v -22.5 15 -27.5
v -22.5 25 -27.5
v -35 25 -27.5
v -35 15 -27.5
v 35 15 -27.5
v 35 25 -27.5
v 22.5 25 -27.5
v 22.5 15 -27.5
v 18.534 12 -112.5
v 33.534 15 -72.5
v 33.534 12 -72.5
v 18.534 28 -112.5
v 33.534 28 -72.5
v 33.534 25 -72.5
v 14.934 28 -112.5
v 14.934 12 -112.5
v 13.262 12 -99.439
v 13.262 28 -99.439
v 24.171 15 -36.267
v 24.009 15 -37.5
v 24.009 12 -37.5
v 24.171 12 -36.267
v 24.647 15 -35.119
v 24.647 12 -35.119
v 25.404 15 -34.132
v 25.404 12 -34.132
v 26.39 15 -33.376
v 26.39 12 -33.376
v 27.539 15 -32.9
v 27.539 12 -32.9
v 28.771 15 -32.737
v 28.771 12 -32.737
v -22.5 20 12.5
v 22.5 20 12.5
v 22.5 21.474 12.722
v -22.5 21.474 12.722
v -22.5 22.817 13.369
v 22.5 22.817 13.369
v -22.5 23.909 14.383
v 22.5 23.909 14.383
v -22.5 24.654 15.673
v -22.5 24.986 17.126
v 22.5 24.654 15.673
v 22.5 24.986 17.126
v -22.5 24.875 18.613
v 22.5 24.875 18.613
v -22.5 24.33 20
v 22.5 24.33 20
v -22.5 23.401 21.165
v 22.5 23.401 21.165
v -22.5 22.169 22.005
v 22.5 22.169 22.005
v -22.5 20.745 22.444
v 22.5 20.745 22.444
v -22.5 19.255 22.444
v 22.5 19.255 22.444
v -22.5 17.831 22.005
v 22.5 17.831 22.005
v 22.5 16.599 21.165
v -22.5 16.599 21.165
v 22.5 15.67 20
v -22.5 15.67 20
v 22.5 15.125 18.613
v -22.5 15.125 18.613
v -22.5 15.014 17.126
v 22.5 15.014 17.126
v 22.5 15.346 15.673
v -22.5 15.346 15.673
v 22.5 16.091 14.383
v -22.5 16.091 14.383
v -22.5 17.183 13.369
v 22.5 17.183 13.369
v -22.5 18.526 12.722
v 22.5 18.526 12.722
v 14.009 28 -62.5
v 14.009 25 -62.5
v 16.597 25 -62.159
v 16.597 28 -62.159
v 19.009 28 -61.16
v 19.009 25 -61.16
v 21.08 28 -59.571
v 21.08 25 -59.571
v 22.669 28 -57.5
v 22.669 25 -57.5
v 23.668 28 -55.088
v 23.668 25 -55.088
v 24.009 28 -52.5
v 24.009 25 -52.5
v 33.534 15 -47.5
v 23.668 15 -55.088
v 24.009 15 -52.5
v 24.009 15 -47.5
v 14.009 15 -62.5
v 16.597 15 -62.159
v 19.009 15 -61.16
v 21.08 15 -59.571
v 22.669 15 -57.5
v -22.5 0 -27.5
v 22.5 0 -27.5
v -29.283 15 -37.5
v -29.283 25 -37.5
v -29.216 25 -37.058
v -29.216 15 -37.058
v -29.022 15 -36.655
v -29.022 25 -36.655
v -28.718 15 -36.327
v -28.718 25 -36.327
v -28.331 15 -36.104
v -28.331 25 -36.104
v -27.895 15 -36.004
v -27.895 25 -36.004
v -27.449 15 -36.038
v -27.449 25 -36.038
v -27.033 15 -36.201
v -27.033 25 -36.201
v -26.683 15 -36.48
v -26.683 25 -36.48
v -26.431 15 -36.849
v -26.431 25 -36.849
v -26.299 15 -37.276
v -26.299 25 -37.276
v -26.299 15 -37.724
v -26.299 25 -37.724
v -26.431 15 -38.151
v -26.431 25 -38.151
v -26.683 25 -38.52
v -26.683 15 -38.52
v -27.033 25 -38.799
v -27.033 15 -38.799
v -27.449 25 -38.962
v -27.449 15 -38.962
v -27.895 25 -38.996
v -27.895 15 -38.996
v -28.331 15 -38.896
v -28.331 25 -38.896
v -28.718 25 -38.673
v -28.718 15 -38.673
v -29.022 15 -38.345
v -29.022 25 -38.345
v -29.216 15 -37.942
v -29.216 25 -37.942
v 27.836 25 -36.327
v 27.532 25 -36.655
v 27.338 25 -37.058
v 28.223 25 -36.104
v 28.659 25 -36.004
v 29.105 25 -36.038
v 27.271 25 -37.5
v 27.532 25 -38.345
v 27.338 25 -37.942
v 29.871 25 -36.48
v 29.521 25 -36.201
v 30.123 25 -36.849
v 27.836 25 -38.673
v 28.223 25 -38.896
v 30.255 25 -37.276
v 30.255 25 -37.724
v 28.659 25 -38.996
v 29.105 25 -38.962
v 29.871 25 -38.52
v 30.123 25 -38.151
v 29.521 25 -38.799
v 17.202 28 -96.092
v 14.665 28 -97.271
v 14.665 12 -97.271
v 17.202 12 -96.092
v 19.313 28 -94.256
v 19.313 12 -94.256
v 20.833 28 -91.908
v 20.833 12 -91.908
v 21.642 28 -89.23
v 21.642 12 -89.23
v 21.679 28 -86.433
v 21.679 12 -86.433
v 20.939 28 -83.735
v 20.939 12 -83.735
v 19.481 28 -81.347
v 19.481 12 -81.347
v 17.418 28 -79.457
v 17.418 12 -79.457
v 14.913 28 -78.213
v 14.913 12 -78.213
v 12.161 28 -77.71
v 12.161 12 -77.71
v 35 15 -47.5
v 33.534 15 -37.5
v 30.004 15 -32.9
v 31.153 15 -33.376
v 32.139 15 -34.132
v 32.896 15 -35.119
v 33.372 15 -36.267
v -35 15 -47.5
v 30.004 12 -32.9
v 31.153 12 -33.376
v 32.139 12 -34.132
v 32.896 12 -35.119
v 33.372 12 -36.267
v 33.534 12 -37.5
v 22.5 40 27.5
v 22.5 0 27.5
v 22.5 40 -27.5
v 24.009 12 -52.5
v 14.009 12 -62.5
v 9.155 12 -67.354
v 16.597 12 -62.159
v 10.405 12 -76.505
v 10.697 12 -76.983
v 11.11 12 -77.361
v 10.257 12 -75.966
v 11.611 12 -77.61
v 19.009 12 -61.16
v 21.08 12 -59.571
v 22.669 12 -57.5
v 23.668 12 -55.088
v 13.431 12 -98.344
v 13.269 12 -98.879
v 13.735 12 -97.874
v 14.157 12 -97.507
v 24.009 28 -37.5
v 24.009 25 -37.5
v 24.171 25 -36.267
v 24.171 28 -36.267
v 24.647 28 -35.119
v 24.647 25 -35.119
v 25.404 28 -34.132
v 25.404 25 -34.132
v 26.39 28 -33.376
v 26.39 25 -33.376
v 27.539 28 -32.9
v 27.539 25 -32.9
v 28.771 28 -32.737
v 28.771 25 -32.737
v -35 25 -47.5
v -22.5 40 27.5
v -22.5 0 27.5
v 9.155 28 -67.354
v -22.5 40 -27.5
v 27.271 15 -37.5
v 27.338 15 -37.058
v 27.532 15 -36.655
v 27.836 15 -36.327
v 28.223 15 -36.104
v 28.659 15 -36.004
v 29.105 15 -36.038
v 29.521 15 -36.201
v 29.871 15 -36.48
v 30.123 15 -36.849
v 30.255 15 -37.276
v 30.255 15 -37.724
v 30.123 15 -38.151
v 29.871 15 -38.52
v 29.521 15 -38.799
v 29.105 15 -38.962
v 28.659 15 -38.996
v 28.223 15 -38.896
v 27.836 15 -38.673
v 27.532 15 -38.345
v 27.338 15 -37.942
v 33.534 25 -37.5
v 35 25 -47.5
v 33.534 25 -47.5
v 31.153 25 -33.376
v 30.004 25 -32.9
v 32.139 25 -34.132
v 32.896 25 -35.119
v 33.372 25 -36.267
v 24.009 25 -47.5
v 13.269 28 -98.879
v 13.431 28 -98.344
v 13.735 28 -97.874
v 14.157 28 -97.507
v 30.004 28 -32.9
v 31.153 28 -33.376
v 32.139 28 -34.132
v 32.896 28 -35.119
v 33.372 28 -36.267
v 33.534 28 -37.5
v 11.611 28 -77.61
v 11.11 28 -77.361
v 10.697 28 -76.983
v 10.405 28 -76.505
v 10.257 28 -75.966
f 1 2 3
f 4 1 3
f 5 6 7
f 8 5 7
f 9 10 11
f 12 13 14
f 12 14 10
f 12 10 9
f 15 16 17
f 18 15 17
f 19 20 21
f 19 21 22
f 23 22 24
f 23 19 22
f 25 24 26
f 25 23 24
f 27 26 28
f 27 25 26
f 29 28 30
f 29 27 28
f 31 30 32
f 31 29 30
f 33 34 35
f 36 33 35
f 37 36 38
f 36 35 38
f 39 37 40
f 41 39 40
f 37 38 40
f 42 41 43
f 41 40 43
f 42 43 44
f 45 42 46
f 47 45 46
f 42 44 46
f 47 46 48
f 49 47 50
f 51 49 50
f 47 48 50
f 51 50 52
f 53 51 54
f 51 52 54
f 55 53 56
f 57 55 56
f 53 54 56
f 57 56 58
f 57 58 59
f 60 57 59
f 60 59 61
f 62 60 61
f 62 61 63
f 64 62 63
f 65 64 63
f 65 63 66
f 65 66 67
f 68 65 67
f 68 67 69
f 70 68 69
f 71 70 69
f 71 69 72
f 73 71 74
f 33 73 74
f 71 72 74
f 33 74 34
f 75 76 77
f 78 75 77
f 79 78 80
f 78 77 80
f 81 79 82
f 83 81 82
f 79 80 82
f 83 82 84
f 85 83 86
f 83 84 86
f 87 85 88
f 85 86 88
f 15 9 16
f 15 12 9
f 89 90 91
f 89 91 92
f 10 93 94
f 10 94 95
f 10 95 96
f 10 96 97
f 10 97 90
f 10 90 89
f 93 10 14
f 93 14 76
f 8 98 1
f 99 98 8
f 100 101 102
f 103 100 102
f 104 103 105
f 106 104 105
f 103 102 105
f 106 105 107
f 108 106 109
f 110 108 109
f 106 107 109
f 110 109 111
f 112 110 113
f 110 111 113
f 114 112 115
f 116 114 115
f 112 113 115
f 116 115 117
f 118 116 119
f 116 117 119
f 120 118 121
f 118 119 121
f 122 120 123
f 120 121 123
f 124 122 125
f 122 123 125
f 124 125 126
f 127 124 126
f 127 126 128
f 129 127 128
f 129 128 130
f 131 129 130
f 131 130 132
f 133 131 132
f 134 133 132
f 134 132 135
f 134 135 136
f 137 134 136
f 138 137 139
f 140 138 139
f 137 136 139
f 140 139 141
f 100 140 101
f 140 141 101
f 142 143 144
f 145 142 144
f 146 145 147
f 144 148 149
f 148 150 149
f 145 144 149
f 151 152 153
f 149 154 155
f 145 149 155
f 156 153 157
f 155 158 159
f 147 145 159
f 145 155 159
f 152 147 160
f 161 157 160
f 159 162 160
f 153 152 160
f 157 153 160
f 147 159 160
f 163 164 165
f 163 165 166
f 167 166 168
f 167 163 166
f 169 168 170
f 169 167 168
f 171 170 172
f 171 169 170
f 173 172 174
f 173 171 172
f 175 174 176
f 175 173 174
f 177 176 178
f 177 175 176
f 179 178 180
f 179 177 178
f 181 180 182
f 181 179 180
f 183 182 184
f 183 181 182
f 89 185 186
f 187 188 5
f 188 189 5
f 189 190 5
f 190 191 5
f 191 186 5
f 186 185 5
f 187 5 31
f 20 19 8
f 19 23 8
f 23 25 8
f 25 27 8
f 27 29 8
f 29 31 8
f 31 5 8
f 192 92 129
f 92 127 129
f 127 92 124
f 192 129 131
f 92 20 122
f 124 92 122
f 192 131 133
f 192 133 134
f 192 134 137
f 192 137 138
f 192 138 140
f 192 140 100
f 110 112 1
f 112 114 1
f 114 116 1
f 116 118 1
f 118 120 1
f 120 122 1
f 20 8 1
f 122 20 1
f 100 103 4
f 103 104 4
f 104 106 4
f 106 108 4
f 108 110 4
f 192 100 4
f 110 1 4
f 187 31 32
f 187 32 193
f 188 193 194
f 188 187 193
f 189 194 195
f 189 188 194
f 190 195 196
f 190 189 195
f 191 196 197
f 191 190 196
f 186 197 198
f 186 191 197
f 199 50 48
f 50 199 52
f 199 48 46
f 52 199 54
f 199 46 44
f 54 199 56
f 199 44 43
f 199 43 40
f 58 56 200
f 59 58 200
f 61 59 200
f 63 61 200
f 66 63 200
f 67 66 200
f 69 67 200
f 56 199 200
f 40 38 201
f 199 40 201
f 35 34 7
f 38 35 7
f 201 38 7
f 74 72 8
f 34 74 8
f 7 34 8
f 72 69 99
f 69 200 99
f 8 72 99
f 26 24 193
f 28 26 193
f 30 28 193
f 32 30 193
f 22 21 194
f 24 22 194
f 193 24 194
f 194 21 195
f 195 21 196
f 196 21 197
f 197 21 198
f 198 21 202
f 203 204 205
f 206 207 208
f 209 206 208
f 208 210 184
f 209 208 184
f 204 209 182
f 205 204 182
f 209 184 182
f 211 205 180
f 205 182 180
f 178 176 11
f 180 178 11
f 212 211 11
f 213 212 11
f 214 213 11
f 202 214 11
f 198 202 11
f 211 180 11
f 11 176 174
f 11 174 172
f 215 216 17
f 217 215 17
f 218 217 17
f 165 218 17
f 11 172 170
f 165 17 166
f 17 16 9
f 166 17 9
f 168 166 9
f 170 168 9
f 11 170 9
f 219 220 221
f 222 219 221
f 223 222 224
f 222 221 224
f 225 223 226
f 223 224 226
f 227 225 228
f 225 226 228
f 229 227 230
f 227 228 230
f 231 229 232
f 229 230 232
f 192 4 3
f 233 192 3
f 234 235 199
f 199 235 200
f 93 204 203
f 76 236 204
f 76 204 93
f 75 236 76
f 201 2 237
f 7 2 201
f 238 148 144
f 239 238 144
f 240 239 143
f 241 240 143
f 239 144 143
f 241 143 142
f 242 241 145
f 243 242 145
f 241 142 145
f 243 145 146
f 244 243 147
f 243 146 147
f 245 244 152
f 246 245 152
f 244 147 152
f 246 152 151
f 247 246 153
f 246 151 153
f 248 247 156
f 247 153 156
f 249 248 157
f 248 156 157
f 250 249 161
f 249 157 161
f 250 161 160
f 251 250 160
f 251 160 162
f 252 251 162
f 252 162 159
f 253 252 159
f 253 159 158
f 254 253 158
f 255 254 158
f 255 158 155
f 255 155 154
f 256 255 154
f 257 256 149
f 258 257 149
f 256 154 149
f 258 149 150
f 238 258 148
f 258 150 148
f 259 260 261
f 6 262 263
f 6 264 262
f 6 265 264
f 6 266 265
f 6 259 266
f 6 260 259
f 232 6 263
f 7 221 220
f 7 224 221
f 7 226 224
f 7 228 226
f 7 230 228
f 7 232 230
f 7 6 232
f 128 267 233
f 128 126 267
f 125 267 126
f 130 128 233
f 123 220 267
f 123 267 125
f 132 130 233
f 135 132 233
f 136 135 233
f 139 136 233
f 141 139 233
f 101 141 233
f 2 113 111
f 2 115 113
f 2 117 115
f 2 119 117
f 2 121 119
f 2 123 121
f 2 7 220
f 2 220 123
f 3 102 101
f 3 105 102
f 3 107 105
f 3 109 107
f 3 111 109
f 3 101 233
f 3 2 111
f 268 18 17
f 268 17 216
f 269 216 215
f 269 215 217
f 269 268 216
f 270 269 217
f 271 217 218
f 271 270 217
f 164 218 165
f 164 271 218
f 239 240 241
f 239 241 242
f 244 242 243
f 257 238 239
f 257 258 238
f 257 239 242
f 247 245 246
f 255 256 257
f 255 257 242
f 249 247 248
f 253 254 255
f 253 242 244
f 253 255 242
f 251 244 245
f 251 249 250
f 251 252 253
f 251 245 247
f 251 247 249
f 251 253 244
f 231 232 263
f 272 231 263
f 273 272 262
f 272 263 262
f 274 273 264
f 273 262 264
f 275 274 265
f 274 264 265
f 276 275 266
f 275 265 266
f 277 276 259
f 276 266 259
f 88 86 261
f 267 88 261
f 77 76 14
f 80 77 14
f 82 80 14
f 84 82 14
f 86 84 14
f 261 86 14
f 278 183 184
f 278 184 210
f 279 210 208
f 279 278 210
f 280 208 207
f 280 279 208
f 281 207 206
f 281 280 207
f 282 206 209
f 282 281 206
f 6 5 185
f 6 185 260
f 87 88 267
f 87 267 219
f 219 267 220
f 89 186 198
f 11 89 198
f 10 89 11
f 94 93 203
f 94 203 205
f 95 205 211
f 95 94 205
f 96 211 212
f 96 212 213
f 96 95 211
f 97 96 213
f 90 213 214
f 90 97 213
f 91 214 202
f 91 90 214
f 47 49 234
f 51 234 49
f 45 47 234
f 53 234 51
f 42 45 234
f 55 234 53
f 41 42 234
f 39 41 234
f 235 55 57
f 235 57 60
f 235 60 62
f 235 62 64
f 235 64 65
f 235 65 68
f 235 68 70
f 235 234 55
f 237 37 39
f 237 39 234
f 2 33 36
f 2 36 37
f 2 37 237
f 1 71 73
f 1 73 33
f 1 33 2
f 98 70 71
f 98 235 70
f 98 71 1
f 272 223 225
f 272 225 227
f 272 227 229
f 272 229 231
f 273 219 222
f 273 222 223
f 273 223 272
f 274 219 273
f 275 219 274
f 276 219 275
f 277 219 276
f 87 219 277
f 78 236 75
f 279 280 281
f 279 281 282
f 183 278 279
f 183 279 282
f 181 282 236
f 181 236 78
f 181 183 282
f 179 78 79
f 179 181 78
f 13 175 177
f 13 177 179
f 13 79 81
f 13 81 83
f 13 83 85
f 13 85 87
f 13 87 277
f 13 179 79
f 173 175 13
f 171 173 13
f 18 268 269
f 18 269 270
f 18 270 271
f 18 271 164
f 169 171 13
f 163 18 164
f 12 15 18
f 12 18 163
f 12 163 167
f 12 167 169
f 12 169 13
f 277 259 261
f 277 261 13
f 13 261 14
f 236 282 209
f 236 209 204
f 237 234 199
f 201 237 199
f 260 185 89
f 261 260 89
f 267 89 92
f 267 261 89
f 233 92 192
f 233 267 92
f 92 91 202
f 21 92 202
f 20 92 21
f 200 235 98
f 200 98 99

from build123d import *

# Parameters (mm, degrees)
SKETCH1_W           = 45
SKETCH1_H           = 55
BOSS_EXTRUDE1_DEPTH = 40
SKETCH2_R           = 5
CUT_EXTRUDE1_DEPTH  = 45
SKETCH3_W           = 70
SKETCH3_H           = 10
BOSS_EXTRUDE2_DEPTH = 20
SKETCH6_R           = 1.5
CUT_EXTRUDE3_DEPTH  = 10
BOSS_EXTRUDE4_DEPTH = 3
BOSS_EXTRUDE5_START = 10
BOSS_EXTRUDE5_DEPTH = 10


with BuildPart() as part:
    # Sketch1 → Boss-Extrude1 (new body)
    with BuildSketch(Plane(origin=(0, 0, 0), x_dir=(1, 0, 0), z_dir=(0, 1, 0))):
        Rectangle(SKETCH1_W, SKETCH1_H)
    extrude(amount=BOSS_EXTRUDE1_DEPTH)

    # Sketch2 → Cut-Extrude1 (cut)
    with BuildSketch(Plane(origin=(22.5, 0, 0), x_dir=(0, 0, -1), z_dir=(1, 0, 0))):
        with Locations((-17.5, 20)):
            Circle(SKETCH2_R)
    extrude(amount=-CUT_EXTRUDE1_DEPTH, mode=Mode.SUBTRACT)

    # Sketch3 → Boss-Extrude2 (add)
    with BuildSketch(Plane(origin=(0, 0, -27.5), x_dir=(-1, 0, 0), z_dir=(0, 0, -1))):
        with Locations((0, 20)):
            Rectangle(SKETCH3_W, SKETCH3_H)
    extrude(amount=BOSS_EXTRUDE2_DEPTH)

    # Sketch6 → Cut-Extrude3 (cut)
    with BuildSketch(Plane(origin=(0, 25, 0), x_dir=(1, 0, 0), z_dir=(0, 1, 0))):
        with Locations(Location((28.771358024, 37.5, 0), (0, 0, 180))):
            Circle(SKETCH6_R)
        with Locations(Location((-27.782656664, 37.5, 0), (0, 0, 180))):
            Circle(SKETCH6_R)
    extrude(amount=-CUT_EXTRUDE3_DEPTH, mode=Mode.SUBTRACT)

    # Sketch7 → Boss-Extrude4 (add)
    with BuildSketch(Plane(origin=(0, 25, 0), x_dir=(1, 0, 0), z_dir=(0, 1, 0))):
        with BuildLine():
            Line((18.533858024, 112.5), (14.933858024, 112.5))
            Line((14.933858024, 112.5), (13.262014547, 99.438722839))
            ThreePointArc((13.262014547, 99.438722839), (13.566755729, 98.09818866), (14.664816743, 97.271048355))
            ThreePointArc((14.664816743, 97.271048355), (21.67882772, 86.432675937), (12.161050226, 77.710372444))
            ThreePointArc((12.161050226, 77.710372444), (10.890055897, 77.186471223), (10.257494727, 75.965911745))
            Line((10.257494727, 75.965911745), (9.15513462, 67.353723404))
            Line((9.15513462, 67.353723404), (14.008858024, 62.5))
            ThreePointArc((14.008858024, 62.5), (21.079925836, 59.571067812), (24.008858024, 52.5))
            Line((24.008858024, 52.5), (24.008858024, 37.5))
            ThreePointArc((24.008858024, 37.5), (25.403761978, 34.132403955), (28.771358024, 32.7375))
            ThreePointArc((28.771358024, 32.7375), (32.138954069, 34.132403955), (33.533858024, 37.5))
            Line((33.533858024, 37.5), (33.533858024, 72.5))
            Line((33.533858024, 72.5), (18.533858024, 112.5))
        make_face()
    boss_extrude4 = extrude(amount=BOSS_EXTRUDE4_DEPTH)

    # Sketch8 → Boss-Extrude5 (add)
    with BuildSketch(Plane.XZ.offset(-25).offset(BOSS_EXTRUDE5_START)):
        with BuildLine():
            Line((33.533858024, -72.5), (14.008858024, -62.5))
            Line((14.008858024, -62.5), (9.15513462, -67.353723404))
            Line((9.15513462, -67.353723404), (10.257494727, -75.965911745))
            ThreePointArc((10.257494727, -75.965911745), (10.890055897, -77.186471223), (12.161050226, -77.710372444))
            ThreePointArc((12.161050226, -77.710372444), (21.67882772, -86.432675937), (14.664816743, -97.271048355))
            ThreePointArc((14.664816743, -97.271048355), (13.566755729, -98.09818866), (13.262014547, -99.438722839))
            Line((13.262014547, -99.438722839), (14.933858024, -112.5))
            Line((14.933858024, -112.5), (18.533858024, -112.5))
            Line((18.533858024, -112.5), (33.533858024, -72.5))
        make_face()
    extrude(amount=-BOSS_EXTRUDE5_DEPTH)

    # Mirror1: Boss-Extrude4 across plane
    add(boss_extrude4.mirror(Plane.ZX.offset(20)))


solid = part.part
